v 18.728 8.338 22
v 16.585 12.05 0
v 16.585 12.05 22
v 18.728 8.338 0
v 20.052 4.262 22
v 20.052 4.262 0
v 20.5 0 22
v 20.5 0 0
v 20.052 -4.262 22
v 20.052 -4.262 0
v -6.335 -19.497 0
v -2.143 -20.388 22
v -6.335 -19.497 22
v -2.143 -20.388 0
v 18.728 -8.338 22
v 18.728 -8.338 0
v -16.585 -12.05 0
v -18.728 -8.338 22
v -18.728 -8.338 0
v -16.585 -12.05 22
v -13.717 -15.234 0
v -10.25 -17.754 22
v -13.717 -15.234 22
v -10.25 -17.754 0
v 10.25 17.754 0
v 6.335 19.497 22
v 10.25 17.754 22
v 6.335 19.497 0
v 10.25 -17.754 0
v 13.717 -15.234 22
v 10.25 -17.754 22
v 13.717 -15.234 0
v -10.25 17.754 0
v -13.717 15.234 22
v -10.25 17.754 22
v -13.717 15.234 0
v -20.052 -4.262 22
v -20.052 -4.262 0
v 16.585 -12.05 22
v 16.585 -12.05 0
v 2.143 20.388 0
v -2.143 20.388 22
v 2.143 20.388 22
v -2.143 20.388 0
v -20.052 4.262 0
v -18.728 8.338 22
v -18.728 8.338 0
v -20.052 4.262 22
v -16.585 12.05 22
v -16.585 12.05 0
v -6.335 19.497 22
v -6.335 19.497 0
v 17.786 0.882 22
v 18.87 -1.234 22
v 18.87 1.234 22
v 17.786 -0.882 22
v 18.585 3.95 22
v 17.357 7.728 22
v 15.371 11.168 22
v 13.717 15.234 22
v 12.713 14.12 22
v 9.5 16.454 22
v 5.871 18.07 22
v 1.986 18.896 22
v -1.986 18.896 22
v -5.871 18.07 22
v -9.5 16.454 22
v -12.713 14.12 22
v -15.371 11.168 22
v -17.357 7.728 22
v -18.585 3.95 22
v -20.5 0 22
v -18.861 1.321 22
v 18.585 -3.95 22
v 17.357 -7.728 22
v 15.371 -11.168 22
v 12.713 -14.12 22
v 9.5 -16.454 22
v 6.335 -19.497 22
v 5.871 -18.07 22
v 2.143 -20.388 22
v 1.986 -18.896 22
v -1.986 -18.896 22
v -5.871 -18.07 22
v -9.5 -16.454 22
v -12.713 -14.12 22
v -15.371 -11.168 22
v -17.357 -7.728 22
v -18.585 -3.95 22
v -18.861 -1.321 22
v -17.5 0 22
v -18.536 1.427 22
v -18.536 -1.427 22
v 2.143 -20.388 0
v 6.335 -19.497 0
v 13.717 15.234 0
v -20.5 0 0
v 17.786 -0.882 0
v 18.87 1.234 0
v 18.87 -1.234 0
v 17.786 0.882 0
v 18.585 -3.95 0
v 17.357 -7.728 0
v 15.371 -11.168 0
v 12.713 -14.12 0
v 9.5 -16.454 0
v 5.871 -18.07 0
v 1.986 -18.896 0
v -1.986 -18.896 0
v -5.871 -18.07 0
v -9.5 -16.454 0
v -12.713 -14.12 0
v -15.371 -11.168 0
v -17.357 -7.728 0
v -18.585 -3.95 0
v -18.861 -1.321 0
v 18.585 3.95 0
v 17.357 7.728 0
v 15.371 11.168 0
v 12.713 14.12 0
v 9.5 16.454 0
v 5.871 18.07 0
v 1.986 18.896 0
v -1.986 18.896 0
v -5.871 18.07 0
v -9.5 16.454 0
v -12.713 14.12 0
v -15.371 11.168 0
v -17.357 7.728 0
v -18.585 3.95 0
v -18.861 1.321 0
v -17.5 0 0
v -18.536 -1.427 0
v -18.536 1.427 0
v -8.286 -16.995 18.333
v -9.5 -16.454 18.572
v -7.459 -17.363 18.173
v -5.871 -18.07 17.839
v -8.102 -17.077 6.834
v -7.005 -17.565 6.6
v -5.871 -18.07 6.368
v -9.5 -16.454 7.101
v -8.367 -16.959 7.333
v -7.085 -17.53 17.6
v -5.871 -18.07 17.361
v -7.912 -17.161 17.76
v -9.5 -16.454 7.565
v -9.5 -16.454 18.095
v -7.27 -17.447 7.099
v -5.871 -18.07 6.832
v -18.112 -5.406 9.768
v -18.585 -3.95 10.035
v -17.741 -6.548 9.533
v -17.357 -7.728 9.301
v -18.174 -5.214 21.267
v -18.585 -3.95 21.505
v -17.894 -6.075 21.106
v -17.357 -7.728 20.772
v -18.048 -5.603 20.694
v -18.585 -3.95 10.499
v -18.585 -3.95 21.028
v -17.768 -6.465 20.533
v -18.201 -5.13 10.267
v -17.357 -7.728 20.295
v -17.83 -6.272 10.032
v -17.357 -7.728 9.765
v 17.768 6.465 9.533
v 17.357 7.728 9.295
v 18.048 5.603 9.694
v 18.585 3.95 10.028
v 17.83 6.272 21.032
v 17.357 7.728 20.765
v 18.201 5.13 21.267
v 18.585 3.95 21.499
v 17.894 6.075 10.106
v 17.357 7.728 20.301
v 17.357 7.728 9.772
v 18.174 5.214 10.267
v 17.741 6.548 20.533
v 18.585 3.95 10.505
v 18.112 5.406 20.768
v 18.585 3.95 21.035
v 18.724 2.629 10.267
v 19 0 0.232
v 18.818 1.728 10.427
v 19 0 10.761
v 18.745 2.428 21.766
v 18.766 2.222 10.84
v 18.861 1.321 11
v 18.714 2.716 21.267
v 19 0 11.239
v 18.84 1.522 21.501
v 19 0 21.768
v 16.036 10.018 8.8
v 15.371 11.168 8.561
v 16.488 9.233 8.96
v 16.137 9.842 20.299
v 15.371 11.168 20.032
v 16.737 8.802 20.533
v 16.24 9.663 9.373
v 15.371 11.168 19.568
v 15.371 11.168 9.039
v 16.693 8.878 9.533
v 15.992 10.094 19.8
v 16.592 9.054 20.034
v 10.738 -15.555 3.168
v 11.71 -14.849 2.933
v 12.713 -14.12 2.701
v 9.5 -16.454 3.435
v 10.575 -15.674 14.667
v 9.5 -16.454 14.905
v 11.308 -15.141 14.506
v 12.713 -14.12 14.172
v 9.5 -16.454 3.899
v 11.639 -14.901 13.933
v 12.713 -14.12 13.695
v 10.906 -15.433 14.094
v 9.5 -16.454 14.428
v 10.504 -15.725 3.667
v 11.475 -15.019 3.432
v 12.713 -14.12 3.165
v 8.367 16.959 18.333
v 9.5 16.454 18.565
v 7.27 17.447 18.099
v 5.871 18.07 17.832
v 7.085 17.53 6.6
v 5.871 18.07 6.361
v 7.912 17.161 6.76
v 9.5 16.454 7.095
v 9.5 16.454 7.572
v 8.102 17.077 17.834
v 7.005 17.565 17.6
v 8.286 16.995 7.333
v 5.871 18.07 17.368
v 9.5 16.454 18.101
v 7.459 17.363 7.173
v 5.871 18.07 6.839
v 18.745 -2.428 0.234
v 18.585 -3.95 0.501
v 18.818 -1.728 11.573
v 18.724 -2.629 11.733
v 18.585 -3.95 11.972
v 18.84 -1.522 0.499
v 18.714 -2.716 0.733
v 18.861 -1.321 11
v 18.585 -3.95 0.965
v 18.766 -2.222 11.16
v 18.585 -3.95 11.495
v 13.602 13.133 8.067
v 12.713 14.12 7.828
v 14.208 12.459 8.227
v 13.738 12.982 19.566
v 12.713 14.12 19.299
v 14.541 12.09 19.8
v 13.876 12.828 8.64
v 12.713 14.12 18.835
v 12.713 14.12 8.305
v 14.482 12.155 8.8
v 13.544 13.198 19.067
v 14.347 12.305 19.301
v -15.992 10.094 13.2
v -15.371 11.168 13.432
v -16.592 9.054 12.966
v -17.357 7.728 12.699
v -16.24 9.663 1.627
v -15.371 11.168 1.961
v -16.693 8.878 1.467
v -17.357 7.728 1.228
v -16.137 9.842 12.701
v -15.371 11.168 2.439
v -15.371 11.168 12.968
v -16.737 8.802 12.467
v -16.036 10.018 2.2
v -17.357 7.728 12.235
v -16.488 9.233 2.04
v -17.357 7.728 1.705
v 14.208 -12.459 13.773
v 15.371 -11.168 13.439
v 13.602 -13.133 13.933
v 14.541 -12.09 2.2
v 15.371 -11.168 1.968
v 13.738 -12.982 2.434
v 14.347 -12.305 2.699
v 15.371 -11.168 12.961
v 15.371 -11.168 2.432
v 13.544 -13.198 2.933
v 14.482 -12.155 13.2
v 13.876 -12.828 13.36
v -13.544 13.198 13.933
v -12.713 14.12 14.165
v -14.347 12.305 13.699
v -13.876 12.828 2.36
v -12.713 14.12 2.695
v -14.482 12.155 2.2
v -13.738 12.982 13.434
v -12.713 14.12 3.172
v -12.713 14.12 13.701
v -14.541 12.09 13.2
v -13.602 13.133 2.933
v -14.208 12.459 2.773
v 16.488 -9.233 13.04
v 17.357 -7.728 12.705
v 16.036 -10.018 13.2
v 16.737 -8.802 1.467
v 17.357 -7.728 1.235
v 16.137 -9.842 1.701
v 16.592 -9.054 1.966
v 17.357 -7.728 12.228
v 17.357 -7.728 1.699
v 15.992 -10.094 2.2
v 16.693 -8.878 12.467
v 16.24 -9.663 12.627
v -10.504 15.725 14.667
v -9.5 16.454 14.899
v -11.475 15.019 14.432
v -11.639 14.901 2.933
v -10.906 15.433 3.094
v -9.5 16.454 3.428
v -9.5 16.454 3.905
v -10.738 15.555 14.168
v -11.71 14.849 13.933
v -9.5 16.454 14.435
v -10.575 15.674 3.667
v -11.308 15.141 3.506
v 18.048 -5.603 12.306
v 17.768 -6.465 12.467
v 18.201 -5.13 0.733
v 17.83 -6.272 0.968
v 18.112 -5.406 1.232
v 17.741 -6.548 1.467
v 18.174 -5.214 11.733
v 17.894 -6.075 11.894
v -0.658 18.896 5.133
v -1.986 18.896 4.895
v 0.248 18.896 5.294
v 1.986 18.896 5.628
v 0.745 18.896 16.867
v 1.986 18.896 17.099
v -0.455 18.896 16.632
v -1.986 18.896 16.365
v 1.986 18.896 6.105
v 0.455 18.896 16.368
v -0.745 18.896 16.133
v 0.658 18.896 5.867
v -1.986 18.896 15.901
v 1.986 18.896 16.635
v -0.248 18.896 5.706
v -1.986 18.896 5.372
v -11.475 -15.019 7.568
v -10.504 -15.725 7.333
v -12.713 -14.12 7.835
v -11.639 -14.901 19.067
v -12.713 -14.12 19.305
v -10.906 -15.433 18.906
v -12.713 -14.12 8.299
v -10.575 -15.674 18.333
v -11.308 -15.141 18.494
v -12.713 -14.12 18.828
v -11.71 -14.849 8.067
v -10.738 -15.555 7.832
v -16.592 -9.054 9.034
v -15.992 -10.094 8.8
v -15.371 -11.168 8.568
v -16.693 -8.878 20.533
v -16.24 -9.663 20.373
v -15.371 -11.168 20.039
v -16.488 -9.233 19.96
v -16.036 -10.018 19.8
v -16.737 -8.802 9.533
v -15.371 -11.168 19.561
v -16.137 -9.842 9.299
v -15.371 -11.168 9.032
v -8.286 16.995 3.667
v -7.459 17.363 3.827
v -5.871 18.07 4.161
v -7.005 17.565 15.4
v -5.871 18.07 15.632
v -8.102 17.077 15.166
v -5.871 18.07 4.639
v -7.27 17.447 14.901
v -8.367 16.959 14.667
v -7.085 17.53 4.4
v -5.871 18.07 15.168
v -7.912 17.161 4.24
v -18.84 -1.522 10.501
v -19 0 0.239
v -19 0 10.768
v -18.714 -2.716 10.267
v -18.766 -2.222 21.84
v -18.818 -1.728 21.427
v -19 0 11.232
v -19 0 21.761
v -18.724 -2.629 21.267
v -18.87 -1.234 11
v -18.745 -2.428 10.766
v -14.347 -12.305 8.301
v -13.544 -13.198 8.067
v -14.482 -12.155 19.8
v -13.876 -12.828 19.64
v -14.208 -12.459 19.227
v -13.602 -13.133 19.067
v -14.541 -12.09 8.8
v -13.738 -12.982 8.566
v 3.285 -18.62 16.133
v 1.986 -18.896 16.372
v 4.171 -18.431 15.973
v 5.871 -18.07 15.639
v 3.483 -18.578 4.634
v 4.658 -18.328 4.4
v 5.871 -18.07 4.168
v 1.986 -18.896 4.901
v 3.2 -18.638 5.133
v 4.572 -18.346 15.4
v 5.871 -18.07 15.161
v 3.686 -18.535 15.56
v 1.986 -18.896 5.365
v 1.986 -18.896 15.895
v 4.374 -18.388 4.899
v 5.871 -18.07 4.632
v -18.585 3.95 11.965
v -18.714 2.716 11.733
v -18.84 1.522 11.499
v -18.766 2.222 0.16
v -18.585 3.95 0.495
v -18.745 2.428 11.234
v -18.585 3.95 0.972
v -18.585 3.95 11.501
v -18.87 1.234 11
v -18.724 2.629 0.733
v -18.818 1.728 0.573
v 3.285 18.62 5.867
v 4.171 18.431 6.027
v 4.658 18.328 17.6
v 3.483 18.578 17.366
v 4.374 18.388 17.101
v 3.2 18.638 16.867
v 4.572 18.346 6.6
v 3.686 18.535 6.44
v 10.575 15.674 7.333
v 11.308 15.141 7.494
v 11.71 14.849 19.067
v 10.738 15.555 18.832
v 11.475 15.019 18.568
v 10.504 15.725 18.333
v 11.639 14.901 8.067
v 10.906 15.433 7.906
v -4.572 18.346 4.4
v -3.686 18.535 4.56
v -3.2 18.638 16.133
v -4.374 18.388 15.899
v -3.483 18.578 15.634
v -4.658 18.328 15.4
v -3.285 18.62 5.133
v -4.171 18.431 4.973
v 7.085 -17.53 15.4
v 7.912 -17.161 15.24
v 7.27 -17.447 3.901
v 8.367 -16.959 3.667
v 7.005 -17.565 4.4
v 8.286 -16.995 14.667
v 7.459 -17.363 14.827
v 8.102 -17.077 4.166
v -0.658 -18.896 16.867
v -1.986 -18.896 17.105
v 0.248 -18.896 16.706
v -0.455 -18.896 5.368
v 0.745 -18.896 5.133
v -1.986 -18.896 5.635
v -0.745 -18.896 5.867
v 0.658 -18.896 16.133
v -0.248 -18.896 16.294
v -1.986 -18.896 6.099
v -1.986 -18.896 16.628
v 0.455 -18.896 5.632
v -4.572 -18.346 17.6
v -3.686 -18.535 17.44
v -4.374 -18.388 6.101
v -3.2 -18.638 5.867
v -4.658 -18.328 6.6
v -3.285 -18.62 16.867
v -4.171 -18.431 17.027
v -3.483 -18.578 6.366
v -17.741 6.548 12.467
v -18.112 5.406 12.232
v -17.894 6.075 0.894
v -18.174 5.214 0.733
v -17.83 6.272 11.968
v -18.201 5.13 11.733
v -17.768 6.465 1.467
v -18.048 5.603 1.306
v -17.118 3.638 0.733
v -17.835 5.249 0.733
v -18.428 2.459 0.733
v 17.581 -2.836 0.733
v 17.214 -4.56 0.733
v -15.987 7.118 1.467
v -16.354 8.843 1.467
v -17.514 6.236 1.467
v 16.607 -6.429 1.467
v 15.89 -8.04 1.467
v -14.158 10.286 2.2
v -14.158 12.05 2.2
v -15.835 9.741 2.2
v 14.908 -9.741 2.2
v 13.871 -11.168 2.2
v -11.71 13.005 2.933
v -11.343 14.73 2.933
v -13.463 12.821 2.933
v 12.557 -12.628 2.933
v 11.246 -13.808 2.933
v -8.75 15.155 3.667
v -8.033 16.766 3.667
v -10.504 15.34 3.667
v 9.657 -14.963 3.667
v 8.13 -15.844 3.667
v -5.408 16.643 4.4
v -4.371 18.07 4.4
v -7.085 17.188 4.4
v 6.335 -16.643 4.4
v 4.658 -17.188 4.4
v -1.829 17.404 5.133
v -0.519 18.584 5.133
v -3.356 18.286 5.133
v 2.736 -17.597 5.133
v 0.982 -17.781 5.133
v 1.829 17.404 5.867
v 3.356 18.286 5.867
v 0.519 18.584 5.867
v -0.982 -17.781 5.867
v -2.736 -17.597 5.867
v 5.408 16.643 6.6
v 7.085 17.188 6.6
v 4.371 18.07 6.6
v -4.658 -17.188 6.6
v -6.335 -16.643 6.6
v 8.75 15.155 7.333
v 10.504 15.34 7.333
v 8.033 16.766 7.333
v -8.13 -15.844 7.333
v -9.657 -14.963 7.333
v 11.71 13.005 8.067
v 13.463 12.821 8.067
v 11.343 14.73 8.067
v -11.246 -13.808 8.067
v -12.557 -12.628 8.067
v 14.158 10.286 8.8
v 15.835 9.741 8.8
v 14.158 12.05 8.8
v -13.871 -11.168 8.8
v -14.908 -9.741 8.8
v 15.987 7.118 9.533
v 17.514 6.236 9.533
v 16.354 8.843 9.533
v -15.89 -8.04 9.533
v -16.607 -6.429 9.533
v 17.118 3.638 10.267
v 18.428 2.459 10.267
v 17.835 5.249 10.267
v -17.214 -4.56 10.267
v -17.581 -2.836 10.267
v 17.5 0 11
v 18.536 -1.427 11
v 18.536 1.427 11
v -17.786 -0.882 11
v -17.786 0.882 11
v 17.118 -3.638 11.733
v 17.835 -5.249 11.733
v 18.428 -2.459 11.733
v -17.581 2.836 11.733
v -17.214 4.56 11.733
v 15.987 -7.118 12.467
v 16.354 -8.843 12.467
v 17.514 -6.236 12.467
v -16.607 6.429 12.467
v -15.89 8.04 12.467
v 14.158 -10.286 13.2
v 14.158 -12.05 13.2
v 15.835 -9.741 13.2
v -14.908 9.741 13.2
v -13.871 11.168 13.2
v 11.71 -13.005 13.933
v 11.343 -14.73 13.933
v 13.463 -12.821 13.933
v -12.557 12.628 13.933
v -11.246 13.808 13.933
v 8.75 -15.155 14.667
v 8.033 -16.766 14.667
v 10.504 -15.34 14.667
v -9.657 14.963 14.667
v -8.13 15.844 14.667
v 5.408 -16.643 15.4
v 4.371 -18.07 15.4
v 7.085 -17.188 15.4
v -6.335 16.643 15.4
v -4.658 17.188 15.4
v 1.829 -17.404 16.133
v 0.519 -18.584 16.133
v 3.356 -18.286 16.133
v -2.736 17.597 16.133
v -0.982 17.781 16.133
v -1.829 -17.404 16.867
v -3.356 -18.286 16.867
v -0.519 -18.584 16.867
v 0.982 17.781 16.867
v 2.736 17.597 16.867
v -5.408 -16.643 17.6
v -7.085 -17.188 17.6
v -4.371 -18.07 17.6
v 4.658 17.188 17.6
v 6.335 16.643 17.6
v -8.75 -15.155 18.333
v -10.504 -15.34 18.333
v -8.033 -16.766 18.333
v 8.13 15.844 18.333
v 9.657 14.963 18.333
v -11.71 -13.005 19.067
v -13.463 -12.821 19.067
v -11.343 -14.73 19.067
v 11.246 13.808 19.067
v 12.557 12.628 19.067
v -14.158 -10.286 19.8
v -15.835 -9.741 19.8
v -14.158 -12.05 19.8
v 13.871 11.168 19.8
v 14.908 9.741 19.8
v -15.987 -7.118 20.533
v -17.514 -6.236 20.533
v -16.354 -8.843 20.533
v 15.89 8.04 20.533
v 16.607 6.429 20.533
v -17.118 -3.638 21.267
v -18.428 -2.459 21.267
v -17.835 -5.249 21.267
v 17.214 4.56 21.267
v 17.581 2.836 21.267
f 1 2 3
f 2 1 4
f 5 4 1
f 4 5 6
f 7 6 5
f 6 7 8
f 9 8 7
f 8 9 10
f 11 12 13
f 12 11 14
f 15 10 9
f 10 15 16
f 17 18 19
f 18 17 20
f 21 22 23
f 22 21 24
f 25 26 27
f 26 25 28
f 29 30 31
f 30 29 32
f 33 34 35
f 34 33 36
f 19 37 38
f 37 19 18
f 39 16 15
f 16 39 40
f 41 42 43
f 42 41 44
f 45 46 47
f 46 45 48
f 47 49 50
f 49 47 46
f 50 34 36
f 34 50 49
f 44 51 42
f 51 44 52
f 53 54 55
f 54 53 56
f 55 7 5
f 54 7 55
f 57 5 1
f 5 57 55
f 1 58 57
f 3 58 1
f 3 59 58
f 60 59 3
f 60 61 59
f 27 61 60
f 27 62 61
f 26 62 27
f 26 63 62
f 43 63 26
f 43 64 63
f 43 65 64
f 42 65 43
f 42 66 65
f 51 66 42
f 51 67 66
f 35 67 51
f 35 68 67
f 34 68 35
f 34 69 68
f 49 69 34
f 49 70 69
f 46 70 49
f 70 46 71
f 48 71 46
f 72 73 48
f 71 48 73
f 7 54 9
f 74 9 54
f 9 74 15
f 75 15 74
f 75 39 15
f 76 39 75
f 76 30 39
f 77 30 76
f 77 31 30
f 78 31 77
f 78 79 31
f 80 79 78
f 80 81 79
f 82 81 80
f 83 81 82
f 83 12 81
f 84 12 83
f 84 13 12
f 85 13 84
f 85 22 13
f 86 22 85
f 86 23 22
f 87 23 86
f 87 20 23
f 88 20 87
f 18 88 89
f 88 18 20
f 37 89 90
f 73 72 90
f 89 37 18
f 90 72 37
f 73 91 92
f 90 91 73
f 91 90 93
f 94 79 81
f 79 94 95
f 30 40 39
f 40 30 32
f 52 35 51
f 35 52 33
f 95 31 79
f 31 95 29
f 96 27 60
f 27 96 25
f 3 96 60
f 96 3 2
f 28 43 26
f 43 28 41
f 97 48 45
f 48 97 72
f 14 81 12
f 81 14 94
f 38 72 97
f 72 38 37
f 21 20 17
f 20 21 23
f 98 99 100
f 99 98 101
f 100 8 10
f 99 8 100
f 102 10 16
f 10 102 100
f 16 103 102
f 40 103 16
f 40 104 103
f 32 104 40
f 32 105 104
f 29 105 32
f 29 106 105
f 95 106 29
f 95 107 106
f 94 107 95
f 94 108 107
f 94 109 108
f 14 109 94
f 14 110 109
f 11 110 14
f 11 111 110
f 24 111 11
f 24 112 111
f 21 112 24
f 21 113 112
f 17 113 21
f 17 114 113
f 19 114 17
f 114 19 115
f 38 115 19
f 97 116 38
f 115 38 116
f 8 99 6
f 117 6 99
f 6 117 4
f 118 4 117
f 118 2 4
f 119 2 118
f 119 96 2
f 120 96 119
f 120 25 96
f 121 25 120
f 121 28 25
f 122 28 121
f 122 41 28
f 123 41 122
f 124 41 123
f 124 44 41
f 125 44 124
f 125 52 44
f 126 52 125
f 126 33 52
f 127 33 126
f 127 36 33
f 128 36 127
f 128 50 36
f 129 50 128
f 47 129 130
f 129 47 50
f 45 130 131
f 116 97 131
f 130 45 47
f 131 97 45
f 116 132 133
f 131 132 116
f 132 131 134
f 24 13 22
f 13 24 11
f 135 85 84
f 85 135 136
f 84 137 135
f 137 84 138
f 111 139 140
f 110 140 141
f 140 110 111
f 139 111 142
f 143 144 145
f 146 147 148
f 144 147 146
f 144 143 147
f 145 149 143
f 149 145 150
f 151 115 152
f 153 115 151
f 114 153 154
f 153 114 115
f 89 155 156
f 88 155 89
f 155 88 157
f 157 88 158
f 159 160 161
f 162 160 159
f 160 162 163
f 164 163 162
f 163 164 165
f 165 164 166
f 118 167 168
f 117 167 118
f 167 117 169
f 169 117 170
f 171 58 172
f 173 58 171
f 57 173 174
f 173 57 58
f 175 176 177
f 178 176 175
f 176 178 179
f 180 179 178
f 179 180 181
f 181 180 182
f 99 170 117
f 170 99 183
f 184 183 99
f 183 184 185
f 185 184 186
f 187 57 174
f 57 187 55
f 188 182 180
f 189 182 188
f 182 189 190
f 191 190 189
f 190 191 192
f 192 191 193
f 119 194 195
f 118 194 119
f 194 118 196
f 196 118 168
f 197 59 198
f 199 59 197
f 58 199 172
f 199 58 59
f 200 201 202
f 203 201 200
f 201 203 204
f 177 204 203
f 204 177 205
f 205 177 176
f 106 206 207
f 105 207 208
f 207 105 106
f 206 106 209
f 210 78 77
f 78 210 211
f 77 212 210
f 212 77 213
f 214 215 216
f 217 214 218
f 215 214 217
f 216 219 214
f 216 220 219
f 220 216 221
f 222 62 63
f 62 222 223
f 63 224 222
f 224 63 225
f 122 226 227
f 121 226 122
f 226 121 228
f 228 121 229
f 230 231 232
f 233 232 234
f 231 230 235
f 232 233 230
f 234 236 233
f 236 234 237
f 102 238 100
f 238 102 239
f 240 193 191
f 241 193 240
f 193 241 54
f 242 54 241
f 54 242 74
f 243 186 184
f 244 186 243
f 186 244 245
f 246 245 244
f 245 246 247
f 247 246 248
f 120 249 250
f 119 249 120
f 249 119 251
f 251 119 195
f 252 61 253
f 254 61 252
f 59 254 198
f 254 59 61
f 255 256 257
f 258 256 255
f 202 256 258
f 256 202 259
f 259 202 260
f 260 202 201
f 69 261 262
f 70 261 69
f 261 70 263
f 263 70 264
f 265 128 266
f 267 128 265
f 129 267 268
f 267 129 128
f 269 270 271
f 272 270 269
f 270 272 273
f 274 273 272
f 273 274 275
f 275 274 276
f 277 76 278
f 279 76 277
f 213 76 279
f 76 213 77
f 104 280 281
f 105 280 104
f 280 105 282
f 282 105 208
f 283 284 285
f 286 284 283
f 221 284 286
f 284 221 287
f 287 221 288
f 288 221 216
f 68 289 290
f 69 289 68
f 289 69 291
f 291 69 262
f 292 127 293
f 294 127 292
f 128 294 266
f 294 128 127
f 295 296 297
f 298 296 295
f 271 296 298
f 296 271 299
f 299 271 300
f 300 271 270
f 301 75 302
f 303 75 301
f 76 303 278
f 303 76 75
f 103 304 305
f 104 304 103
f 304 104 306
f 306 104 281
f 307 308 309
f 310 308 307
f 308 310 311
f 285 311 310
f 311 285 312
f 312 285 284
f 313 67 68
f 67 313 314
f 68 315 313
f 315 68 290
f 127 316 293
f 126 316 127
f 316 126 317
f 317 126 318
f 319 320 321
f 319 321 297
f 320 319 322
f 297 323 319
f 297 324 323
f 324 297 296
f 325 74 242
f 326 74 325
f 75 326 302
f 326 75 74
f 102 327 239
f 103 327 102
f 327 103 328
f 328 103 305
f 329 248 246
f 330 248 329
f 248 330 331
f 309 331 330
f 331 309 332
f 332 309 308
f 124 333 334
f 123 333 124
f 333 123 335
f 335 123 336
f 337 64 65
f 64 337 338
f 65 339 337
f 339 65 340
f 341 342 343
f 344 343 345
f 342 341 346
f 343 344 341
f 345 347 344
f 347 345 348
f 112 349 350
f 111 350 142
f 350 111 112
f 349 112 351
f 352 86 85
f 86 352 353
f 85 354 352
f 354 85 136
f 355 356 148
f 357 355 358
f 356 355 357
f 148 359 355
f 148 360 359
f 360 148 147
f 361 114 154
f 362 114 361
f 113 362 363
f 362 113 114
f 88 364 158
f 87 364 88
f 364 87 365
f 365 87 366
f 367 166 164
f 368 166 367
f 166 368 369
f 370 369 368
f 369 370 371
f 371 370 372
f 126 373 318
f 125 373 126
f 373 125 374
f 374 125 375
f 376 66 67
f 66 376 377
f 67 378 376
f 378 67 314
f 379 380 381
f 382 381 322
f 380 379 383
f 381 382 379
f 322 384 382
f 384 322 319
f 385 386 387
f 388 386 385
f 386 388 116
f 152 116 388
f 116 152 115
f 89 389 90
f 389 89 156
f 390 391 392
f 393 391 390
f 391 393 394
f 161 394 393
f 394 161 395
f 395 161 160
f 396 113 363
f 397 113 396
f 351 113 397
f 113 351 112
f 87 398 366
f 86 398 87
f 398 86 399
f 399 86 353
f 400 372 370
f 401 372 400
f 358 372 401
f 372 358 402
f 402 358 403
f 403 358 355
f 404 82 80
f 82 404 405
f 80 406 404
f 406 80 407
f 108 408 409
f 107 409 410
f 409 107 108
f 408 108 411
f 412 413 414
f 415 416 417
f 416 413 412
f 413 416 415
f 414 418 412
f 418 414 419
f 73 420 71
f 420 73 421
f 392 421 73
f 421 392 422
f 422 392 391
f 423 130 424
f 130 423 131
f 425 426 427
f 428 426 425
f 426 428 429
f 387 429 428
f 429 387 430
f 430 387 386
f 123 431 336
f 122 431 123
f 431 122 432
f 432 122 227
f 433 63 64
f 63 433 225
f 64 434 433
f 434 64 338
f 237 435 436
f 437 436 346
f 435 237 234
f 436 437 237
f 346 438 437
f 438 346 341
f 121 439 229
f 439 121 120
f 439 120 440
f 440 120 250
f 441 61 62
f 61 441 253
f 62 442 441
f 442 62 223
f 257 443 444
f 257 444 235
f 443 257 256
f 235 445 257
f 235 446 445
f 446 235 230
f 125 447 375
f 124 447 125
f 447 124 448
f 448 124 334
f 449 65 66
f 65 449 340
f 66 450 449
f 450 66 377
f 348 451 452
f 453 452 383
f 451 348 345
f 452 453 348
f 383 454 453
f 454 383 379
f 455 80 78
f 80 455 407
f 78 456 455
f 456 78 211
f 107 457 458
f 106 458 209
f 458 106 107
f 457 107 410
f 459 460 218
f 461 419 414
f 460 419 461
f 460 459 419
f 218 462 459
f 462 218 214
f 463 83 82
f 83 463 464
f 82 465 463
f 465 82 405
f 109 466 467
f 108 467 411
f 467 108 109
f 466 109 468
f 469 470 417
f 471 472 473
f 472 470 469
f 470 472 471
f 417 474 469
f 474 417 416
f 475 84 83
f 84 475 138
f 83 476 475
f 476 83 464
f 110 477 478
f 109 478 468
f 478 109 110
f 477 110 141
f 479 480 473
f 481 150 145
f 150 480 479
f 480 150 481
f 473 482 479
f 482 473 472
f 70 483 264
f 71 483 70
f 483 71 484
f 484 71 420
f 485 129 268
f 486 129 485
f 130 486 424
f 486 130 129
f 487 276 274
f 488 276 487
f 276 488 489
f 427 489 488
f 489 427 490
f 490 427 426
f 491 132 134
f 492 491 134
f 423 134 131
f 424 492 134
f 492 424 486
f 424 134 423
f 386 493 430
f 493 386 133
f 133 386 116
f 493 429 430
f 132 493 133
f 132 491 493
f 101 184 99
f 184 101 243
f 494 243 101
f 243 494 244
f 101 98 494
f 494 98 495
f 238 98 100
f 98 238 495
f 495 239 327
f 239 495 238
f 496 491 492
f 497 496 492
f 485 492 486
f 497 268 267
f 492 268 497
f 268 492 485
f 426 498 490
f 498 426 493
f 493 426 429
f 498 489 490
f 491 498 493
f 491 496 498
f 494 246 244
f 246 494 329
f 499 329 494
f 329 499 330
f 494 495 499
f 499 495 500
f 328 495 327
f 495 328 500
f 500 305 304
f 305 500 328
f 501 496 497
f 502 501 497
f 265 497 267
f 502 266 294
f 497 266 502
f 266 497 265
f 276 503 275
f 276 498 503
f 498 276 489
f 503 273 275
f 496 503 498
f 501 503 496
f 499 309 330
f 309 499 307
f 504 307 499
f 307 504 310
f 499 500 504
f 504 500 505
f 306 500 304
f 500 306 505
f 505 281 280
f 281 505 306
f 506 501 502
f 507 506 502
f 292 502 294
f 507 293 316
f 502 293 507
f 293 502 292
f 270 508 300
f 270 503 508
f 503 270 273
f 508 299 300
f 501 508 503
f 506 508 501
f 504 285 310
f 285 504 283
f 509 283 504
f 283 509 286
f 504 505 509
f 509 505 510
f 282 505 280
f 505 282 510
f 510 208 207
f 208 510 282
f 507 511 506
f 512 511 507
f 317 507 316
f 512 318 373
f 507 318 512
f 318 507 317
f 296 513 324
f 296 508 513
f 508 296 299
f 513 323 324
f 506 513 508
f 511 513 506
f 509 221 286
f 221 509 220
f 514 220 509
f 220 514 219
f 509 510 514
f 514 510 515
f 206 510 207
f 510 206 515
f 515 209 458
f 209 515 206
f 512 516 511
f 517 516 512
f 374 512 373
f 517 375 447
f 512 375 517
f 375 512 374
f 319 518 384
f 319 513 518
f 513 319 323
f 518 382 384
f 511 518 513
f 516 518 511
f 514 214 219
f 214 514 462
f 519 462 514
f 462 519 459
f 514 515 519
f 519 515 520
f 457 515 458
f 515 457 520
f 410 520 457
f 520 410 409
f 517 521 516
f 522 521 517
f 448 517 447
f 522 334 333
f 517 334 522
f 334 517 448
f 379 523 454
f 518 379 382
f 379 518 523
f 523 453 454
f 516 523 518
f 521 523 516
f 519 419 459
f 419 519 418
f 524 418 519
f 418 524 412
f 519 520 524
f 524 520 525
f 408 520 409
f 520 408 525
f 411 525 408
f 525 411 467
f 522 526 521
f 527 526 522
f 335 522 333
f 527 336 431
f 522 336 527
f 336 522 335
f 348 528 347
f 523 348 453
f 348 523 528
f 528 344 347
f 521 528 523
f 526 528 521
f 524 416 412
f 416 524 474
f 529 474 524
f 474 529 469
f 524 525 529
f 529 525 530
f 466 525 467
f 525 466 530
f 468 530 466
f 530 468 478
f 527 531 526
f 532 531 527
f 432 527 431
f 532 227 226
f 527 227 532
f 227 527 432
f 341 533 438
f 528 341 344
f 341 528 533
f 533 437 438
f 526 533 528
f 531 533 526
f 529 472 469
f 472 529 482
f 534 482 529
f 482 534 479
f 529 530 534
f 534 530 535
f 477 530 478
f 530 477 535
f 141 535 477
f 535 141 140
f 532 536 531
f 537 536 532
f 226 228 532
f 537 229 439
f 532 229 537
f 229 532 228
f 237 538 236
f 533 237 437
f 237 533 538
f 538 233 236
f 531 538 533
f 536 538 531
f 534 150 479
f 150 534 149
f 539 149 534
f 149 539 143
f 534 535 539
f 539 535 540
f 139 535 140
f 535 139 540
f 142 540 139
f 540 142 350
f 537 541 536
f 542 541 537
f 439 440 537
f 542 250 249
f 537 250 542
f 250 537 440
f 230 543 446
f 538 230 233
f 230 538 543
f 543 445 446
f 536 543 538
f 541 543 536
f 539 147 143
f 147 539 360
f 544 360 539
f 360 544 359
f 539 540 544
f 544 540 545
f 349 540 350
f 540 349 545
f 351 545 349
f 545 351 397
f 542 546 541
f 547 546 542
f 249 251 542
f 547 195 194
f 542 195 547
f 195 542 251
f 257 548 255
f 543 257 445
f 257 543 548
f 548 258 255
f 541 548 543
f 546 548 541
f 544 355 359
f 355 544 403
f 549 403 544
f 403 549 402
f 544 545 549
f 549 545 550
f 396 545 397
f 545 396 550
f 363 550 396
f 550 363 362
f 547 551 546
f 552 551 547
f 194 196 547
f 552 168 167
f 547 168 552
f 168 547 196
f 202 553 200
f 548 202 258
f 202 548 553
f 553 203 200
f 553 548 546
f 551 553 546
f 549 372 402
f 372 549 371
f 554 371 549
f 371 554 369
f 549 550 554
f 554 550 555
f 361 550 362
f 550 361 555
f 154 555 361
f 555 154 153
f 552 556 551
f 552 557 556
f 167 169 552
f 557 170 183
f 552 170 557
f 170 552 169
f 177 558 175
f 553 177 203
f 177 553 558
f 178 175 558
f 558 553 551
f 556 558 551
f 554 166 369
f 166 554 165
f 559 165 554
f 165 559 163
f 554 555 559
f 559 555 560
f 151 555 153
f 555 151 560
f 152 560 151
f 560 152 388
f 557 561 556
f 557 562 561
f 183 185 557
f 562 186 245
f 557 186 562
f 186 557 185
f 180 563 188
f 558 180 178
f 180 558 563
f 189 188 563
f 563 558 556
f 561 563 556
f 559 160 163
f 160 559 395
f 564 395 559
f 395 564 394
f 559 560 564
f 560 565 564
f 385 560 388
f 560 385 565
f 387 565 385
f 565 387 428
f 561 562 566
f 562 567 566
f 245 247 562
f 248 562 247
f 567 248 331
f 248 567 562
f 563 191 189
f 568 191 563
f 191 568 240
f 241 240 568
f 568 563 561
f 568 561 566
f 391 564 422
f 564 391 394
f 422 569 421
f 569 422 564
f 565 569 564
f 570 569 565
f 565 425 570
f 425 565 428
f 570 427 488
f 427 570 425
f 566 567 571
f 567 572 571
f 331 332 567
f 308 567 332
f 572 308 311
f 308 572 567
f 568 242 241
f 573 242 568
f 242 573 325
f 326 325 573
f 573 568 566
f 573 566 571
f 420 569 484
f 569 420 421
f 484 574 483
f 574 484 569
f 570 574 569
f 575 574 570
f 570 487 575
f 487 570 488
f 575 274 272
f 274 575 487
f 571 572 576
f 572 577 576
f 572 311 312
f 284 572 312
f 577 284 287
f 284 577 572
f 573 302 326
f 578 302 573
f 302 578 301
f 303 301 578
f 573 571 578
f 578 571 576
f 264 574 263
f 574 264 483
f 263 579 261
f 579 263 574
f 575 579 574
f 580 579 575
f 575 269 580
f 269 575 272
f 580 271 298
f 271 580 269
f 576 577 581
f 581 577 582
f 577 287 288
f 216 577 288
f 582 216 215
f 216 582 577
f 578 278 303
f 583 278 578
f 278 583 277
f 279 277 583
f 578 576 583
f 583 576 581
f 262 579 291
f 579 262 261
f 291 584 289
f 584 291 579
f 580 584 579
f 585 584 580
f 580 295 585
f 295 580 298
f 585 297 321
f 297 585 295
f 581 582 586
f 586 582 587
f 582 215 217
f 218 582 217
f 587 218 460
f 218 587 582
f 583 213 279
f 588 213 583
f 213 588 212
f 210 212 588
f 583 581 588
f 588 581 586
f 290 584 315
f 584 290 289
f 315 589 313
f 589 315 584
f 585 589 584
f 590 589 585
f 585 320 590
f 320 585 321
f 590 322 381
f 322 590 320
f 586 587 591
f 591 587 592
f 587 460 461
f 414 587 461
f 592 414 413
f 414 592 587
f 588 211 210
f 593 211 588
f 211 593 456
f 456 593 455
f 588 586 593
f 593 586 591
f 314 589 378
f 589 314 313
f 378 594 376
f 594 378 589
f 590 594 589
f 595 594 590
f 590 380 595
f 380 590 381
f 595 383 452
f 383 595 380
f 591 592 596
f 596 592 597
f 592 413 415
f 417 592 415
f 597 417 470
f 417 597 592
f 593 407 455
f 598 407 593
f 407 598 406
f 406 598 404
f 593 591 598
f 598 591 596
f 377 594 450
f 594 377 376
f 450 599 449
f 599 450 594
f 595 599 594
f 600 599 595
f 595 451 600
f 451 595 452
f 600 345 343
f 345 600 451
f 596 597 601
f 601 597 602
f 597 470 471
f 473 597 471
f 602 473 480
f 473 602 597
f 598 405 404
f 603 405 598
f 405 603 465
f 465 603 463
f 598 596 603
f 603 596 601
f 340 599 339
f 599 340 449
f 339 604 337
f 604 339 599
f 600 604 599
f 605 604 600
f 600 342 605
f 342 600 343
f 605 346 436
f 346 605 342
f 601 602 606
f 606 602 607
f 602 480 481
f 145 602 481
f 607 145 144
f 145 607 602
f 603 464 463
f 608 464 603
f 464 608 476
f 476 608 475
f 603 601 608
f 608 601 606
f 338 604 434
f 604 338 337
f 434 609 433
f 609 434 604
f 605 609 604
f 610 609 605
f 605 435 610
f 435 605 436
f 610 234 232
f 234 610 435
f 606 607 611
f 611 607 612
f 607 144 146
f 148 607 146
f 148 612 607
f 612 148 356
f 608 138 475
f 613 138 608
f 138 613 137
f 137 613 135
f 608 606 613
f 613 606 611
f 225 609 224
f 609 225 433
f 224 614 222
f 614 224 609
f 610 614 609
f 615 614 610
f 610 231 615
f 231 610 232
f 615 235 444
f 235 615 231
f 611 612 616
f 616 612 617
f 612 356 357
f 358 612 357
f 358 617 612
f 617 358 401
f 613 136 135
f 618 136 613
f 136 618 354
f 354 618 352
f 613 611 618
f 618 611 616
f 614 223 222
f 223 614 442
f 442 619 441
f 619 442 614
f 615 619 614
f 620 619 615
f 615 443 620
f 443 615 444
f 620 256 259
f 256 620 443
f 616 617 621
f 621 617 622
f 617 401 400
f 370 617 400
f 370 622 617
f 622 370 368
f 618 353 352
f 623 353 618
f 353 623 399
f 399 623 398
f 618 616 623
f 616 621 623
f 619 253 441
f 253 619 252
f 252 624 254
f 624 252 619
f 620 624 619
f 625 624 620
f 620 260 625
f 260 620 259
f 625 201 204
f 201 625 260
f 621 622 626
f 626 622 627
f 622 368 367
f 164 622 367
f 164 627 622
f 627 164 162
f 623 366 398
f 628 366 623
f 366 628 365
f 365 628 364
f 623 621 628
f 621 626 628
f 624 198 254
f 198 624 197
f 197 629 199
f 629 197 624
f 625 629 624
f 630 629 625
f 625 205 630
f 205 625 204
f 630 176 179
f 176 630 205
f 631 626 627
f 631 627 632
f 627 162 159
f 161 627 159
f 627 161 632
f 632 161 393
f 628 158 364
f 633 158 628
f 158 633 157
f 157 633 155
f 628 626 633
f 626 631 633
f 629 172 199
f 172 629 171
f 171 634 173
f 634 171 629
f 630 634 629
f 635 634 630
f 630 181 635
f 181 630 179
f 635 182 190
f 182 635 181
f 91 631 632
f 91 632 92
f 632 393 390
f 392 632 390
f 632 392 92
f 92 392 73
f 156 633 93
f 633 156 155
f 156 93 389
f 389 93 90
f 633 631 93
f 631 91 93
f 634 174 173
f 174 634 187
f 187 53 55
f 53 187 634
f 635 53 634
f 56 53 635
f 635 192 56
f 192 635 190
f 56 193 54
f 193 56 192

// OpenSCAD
difference() {
	cylinder(h=22, r=20.5);
	cylinder(h=22, r=19);
}

// Helix test using 2D subsystem.
// By Andrew Plumb, 2010
// code nabbed from http://rocklinux.net/pipermail/openscad/attachments/20100114/50ee67d9/helix.obj

module helix_footprint(helix_r=50
	,arm_r=10
	,arm_offset=1
	,arm_rot=30
	) {
  union() {
    translate([ -helix_r,0])
      rotate([0,0,arm_rot]) translate([-arm_offset,0,0])
	circle(arm_r,0);
    translate([ helix_r,0])
      rotate([0,0,arm_rot]) translate([arm_offset,0,0])
	circle(arm_r,0);
  }
}

module helix_coil(helix_r=50
	, arm_r=10
	, helix_h=100
	,arm_offset=0
	,arm_rot=0
	) {
  linear_extrude(height=helix_h, convexity=10, twist=360.0)
	helix_footprint(helix_r=helix_r
		,arm_r=arm_r
		,arm_offset=arm_offset
		,arm_rot=arm_rot
	);
}

helix_coil(helix_h=22
	,arm_r=1.5
	,helix_r=19
	);
